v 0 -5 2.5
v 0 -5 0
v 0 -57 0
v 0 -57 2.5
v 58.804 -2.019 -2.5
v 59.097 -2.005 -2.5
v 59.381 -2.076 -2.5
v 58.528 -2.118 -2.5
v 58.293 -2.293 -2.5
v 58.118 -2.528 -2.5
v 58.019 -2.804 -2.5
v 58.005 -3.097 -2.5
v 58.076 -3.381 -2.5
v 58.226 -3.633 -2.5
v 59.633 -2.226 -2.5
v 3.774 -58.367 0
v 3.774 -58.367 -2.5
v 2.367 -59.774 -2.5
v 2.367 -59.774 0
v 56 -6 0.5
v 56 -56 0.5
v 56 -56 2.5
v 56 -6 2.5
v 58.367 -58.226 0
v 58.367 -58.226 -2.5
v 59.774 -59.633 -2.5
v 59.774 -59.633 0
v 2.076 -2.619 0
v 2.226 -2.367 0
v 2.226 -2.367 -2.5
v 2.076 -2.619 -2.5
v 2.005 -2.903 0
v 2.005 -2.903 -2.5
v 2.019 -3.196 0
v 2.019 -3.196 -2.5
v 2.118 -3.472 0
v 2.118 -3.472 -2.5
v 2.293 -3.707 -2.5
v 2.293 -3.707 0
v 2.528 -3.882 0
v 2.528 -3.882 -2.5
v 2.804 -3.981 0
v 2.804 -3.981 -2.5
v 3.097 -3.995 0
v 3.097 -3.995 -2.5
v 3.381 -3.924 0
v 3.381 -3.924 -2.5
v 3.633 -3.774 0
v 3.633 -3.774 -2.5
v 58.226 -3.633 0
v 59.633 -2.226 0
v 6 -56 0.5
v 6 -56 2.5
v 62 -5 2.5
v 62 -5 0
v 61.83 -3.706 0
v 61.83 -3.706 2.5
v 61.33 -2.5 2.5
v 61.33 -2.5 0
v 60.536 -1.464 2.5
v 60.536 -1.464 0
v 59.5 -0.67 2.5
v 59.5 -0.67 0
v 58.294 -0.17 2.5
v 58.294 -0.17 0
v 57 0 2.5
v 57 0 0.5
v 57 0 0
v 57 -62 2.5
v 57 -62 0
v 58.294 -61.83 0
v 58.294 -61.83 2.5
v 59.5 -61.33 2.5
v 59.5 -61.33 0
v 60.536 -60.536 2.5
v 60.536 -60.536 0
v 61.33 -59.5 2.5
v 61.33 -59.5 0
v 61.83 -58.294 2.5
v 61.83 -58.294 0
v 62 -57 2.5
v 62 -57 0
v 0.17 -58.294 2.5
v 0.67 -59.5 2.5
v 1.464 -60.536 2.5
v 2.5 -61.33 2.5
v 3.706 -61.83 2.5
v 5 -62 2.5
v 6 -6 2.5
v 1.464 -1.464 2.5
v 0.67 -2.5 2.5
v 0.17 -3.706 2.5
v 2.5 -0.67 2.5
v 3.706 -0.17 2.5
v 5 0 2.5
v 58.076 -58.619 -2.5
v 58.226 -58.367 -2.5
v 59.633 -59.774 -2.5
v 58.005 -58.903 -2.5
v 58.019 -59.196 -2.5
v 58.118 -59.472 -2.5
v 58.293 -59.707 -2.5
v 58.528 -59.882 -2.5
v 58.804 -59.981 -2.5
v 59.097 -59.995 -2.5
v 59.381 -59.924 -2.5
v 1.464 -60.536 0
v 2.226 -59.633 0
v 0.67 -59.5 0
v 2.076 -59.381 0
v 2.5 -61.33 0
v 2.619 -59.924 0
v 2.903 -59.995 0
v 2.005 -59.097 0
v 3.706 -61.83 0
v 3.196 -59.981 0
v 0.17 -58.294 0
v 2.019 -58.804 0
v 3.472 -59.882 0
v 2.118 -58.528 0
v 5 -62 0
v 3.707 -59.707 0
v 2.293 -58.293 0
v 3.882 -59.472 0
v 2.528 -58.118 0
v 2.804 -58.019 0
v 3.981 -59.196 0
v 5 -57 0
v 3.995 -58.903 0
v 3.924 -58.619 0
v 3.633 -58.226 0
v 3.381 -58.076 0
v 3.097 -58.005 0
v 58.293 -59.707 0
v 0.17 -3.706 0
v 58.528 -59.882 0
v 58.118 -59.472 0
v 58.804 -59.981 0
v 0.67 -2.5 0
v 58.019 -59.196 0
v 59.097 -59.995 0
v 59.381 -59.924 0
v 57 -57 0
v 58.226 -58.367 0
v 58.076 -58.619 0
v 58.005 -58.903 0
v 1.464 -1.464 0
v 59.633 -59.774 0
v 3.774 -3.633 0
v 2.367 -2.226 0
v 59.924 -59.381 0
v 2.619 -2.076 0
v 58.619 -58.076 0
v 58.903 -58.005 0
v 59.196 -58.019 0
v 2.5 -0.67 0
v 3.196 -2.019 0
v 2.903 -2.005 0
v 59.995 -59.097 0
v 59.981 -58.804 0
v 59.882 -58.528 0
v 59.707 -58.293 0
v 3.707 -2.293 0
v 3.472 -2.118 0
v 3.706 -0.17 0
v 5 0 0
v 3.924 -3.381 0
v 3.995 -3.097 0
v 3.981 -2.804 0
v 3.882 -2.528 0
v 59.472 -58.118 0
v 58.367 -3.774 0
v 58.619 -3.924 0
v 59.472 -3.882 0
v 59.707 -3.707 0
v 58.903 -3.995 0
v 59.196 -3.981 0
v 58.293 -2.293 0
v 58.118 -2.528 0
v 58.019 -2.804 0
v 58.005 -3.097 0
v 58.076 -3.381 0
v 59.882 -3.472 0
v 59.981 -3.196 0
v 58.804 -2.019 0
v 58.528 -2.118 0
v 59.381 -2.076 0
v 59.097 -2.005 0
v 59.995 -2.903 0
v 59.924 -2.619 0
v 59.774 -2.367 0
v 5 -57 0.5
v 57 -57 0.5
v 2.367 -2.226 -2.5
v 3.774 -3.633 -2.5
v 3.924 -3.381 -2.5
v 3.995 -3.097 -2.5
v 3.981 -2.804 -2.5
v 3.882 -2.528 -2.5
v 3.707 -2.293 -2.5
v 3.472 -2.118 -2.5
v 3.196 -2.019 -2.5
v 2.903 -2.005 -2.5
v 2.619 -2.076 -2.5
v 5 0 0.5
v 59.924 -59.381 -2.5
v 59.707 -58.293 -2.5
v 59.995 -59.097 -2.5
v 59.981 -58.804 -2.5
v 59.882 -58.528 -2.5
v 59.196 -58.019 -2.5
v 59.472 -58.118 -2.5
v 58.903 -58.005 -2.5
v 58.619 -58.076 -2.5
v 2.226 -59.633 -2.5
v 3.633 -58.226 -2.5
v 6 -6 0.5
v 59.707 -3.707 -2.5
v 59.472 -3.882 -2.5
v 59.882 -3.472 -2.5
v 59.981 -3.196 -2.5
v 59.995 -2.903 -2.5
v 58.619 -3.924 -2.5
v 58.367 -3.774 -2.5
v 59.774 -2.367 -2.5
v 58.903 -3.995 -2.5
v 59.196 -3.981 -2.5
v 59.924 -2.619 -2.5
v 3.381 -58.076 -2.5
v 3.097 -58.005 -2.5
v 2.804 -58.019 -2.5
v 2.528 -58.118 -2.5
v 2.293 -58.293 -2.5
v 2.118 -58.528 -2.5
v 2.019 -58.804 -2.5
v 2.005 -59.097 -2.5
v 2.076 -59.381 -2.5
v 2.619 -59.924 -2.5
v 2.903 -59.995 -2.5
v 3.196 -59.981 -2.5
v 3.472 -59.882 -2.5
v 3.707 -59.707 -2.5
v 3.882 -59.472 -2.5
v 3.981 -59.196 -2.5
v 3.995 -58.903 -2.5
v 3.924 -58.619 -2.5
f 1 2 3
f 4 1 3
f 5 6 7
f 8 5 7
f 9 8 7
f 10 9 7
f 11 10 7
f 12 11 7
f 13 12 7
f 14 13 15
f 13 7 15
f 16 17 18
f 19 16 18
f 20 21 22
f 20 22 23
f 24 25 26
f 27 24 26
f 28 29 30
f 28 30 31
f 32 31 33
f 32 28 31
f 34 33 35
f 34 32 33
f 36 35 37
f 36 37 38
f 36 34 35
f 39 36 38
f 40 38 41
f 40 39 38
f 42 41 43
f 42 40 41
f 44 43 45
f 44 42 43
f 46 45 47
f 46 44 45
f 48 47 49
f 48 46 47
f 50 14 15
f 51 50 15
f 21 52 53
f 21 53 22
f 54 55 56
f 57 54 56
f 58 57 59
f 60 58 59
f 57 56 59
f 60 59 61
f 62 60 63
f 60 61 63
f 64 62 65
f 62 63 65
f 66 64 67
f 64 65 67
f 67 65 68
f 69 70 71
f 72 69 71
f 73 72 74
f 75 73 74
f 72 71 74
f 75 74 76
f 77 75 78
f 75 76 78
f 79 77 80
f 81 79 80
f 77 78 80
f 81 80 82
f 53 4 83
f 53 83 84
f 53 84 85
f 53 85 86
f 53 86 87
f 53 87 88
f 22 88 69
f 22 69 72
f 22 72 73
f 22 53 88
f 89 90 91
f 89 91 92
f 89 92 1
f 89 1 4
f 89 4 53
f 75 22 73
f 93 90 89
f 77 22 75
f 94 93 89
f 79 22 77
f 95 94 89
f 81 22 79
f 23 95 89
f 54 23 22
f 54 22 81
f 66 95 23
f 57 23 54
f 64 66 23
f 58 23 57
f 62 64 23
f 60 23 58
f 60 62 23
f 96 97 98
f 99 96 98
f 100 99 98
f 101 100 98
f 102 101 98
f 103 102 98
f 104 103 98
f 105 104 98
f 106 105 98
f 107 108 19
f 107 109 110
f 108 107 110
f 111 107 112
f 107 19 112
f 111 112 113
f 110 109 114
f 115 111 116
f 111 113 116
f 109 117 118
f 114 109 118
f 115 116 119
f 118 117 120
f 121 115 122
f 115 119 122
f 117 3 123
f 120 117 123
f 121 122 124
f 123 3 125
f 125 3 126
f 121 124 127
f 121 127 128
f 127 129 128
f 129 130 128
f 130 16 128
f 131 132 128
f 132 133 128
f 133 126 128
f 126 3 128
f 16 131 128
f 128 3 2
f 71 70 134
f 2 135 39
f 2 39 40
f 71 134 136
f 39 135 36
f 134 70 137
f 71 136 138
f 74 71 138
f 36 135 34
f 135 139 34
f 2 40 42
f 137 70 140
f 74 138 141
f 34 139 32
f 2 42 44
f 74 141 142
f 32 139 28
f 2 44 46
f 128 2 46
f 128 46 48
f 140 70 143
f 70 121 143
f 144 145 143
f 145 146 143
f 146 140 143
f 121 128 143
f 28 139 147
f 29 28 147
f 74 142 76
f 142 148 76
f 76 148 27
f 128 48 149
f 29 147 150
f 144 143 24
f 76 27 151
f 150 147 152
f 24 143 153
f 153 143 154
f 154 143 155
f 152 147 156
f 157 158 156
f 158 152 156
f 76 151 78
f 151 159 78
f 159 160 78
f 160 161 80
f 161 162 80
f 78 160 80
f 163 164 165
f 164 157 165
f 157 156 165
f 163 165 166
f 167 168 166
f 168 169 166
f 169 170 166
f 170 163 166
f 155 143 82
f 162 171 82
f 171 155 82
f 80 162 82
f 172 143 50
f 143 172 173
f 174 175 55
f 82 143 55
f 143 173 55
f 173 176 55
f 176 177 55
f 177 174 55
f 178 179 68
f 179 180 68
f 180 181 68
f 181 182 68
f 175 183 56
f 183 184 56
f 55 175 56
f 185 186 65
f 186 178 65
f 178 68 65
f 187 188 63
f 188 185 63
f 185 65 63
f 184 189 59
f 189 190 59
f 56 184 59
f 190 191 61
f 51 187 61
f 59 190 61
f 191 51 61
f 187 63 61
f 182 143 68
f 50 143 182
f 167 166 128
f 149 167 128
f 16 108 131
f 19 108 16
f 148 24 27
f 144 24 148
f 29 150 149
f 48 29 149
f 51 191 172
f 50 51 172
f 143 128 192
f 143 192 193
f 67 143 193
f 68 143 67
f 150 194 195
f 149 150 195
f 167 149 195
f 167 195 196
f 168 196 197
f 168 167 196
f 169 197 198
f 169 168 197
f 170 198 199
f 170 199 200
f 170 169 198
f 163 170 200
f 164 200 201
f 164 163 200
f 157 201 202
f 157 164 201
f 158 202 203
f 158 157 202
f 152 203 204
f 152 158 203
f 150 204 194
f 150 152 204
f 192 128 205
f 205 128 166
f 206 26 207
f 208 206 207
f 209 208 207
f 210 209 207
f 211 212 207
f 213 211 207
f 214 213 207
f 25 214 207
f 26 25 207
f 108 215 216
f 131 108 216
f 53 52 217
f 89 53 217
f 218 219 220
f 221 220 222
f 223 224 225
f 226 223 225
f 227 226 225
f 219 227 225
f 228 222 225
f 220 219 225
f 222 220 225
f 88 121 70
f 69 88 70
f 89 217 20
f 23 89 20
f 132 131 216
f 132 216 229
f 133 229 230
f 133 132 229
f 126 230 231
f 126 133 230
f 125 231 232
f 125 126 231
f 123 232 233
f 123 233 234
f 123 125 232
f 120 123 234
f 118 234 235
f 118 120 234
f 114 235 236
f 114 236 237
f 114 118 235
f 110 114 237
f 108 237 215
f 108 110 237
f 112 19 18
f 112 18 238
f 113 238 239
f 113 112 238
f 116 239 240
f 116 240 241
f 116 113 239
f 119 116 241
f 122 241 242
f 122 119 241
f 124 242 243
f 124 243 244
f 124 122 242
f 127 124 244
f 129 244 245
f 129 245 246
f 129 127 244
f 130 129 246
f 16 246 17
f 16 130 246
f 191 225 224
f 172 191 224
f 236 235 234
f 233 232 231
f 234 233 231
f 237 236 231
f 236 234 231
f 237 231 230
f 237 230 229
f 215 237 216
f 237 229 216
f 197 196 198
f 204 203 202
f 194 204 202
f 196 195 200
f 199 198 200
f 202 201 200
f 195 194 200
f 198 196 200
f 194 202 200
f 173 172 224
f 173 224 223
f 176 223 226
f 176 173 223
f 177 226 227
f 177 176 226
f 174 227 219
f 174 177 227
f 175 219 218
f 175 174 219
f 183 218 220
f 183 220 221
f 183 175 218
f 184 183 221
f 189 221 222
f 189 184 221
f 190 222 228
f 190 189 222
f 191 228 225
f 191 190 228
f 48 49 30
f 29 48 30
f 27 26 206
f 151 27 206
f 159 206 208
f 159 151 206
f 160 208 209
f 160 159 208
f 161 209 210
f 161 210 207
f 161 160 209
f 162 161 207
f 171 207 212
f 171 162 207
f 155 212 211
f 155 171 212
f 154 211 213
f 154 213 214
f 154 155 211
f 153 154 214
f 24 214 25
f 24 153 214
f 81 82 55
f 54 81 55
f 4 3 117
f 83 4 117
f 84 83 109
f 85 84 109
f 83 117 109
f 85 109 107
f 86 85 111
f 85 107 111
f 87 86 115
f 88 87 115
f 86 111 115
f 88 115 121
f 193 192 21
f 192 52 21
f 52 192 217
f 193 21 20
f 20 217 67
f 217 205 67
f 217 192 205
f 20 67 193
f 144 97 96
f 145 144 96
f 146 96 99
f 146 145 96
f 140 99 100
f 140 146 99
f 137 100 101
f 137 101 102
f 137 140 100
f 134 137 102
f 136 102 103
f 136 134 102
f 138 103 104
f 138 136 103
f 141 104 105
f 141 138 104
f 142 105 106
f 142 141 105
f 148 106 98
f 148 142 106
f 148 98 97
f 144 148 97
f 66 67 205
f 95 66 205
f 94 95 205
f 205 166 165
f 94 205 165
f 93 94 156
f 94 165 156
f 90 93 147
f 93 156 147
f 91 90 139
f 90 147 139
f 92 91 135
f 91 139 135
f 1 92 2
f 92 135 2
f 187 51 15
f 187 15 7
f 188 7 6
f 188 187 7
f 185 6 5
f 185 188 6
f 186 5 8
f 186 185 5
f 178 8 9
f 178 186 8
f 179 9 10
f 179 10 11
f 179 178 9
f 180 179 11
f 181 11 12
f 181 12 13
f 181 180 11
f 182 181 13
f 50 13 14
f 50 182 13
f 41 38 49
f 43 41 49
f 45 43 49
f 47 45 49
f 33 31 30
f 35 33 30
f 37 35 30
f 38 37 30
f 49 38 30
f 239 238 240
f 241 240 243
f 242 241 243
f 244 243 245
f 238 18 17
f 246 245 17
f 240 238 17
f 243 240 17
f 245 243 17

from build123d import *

# Parameters (mm, degrees)
F0_R          = 1
F0_W          = 52
F0_H          = 52
F0_W_2        = 50
F0_H_2        = 50
F1_DEPTH      = 2.5
F2_DEPTH      = 0.5
F3_W          = 52
F3_H          = 5
F4_DEPTH      = 0.5
F5_DEPTH      = 2.5
F5_DEPTH_BACK = 2.5
F7_DEPTH      = 2.5
F9_DEPTH      = 2.5


with BuildPart() as f1:
    # F0 (on Top) → F1 (new body)
    with BuildSketch(Plane.XY):
        with BuildLine():
            Line((57, 0), (5, 0))
            ThreePointArc((5, 0), (1.4644660941, -1.4644660941), (0, -5))
            Line((0, -5), (0, -57))
            ThreePointArc((0, -57), (1.4644660941, -60.5355339059), (5, -62))
            Line((5, -62), (57, -62))
            ThreePointArc((57, -62), (60.5355339059, -60.5355339059), (62, -57))
            Line((62, -57), (62, -5))
            ThreePointArc((62, -5), (60.5355339059, -1.4644660941), (57, 0))
        make_face()
        with Locations((3, -59)):
            Circle(F0_R, mode=Mode.SUBTRACT)
        with Locations((59, -59)):
            Circle(F0_R, mode=Mode.SUBTRACT)
        with Locations((3, -3)):
            Circle(F0_R, mode=Mode.SUBTRACT)
        with Locations((31, -31)):
            Rectangle(F0_W, F0_H, mode=Mode.SUBTRACT)
        with Locations((59, -3)):
            Circle(F0_R, mode=Mode.SUBTRACT)
        with Locations((31, -31)):
            Rectangle(F0_W, F0_H)
        with Locations((31, -31)):
            Rectangle(F0_W_2, F0_H_2, mode=Mode.SUBTRACT)
    extrude(amount=F1_DEPTH)

    # F0 (on Top) → F2 (cut)
    with BuildSketch(Plane.XY):
        with Locations((31, -31)):
            Rectangle(F0_W, F0_H)
        with Locations((31, -31)):
            Rectangle(F0_W_2, F0_H_2, mode=Mode.SUBTRACT)
    extrude(amount=F2_DEPTH, mode=Mode.SUBTRACT)

    # F3 (on face) → F4 (cut)
    with BuildSketch(Plane.XY):
        with Locations((31, -2.5)):
            Rectangle(F3_W, F3_H)
    extrude(amount=F4_DEPTH, mode=Mode.SUBTRACT)

    # F0 (on Top) → F5 (join, two sides)
    with BuildSketch(Plane.XY) as f5_sk:
        with Locations((59, -59)):
            Circle(F0_R)
        with Locations((59, -3)):
            Circle(F0_R)
        with Locations((3, -3)):
            Circle(F0_R)
        with Locations((3, -59)):
            Circle(F0_R)
    extrude(amount=F5_DEPTH)
    extrude(f5_sk.sketch, amount=-F5_DEPTH_BACK)

    # F6 (on face) → F7 (cut)
    with BuildSketch(Plane(origin=(0, 0, -2.5), x_dir=(1, 0, 0), z_dir=(0, 0, -1))):
        with BuildLine():
            ThreePointArc((58.3671483141, 3.7742730421), (58.2928932188, 3.7071067812), (58.2257269579, 3.6328516859))
            Line((58.2257269579, 3.6328516859), (59.6328516859, 2.2257269579))
            ThreePointArc((59.6328516859, 2.2257269579), (59.7071067812, 2.2928932188), (59.7742730421, 2.3671483141))
            Line((59.7742730421, 2.3671483141), (58.3671483141, 3.7742730421))
        make_face()
    extrude(amount=-F7_DEPTH, mode=Mode.SUBTRACT)

    # F8 (on face) → F9 (cut)
    with BuildSketch(Plane(origin=(0, 0, -2.5), x_dir=(1, 0, 0), z_dir=(0, 0, -1))):
        with BuildLine():
            ThreePointArc((58.2221825407, 58.3636038969), (58.2221825407, 58.2221825407), (58.3636038969, 58.2221825407))
            Line((58.3636038969, 58.2221825407), (59.7778174593, 59.6363961031))
            ThreePointArc((59.7778174593, 59.6363961031), (59.7778174593, 59.7778174593), (59.6363961031, 59.7778174593))
            Line((59.6363961031, 59.7778174593), (58.2221825407, 58.3636038969))
        make_face()
        with BuildLine():
            ThreePointArc((2.2221825407, 2.3636038969), (2.2221825407, 2.2221825407), (2.3636038969, 2.2221825407))
            Line((2.3636038969, 2.2221825407), (3.7778174593, 3.6363961031))
            ThreePointArc((3.7778174593, 3.6363961031), (3.7778174593, 3.7778174593), (3.6363961031, 3.7778174593))
            Line((3.6363961031, 3.7778174593), (2.2221825407, 2.3636038969))
        make_face()
        with BuildLine():
            ThreePointArc((2.3671483141, 59.7742730421), (2.2928932188, 59.7071067812), (2.2257269579, 59.6328516859))
            Line((2.2257269579, 59.6328516859), (3.6328516859, 58.2257269579))
            ThreePointArc((3.6328516859, 58.2257269579), (3.7071067812, 58.2928932188), (3.7742730421, 58.3671483141))
            Line((3.7742730421, 58.3671483141), (2.3671483141, 59.7742730421))
        make_face()
    extrude(amount=-F9_DEPTH, mode=Mode.SUBTRACT)


solid = f1.part
